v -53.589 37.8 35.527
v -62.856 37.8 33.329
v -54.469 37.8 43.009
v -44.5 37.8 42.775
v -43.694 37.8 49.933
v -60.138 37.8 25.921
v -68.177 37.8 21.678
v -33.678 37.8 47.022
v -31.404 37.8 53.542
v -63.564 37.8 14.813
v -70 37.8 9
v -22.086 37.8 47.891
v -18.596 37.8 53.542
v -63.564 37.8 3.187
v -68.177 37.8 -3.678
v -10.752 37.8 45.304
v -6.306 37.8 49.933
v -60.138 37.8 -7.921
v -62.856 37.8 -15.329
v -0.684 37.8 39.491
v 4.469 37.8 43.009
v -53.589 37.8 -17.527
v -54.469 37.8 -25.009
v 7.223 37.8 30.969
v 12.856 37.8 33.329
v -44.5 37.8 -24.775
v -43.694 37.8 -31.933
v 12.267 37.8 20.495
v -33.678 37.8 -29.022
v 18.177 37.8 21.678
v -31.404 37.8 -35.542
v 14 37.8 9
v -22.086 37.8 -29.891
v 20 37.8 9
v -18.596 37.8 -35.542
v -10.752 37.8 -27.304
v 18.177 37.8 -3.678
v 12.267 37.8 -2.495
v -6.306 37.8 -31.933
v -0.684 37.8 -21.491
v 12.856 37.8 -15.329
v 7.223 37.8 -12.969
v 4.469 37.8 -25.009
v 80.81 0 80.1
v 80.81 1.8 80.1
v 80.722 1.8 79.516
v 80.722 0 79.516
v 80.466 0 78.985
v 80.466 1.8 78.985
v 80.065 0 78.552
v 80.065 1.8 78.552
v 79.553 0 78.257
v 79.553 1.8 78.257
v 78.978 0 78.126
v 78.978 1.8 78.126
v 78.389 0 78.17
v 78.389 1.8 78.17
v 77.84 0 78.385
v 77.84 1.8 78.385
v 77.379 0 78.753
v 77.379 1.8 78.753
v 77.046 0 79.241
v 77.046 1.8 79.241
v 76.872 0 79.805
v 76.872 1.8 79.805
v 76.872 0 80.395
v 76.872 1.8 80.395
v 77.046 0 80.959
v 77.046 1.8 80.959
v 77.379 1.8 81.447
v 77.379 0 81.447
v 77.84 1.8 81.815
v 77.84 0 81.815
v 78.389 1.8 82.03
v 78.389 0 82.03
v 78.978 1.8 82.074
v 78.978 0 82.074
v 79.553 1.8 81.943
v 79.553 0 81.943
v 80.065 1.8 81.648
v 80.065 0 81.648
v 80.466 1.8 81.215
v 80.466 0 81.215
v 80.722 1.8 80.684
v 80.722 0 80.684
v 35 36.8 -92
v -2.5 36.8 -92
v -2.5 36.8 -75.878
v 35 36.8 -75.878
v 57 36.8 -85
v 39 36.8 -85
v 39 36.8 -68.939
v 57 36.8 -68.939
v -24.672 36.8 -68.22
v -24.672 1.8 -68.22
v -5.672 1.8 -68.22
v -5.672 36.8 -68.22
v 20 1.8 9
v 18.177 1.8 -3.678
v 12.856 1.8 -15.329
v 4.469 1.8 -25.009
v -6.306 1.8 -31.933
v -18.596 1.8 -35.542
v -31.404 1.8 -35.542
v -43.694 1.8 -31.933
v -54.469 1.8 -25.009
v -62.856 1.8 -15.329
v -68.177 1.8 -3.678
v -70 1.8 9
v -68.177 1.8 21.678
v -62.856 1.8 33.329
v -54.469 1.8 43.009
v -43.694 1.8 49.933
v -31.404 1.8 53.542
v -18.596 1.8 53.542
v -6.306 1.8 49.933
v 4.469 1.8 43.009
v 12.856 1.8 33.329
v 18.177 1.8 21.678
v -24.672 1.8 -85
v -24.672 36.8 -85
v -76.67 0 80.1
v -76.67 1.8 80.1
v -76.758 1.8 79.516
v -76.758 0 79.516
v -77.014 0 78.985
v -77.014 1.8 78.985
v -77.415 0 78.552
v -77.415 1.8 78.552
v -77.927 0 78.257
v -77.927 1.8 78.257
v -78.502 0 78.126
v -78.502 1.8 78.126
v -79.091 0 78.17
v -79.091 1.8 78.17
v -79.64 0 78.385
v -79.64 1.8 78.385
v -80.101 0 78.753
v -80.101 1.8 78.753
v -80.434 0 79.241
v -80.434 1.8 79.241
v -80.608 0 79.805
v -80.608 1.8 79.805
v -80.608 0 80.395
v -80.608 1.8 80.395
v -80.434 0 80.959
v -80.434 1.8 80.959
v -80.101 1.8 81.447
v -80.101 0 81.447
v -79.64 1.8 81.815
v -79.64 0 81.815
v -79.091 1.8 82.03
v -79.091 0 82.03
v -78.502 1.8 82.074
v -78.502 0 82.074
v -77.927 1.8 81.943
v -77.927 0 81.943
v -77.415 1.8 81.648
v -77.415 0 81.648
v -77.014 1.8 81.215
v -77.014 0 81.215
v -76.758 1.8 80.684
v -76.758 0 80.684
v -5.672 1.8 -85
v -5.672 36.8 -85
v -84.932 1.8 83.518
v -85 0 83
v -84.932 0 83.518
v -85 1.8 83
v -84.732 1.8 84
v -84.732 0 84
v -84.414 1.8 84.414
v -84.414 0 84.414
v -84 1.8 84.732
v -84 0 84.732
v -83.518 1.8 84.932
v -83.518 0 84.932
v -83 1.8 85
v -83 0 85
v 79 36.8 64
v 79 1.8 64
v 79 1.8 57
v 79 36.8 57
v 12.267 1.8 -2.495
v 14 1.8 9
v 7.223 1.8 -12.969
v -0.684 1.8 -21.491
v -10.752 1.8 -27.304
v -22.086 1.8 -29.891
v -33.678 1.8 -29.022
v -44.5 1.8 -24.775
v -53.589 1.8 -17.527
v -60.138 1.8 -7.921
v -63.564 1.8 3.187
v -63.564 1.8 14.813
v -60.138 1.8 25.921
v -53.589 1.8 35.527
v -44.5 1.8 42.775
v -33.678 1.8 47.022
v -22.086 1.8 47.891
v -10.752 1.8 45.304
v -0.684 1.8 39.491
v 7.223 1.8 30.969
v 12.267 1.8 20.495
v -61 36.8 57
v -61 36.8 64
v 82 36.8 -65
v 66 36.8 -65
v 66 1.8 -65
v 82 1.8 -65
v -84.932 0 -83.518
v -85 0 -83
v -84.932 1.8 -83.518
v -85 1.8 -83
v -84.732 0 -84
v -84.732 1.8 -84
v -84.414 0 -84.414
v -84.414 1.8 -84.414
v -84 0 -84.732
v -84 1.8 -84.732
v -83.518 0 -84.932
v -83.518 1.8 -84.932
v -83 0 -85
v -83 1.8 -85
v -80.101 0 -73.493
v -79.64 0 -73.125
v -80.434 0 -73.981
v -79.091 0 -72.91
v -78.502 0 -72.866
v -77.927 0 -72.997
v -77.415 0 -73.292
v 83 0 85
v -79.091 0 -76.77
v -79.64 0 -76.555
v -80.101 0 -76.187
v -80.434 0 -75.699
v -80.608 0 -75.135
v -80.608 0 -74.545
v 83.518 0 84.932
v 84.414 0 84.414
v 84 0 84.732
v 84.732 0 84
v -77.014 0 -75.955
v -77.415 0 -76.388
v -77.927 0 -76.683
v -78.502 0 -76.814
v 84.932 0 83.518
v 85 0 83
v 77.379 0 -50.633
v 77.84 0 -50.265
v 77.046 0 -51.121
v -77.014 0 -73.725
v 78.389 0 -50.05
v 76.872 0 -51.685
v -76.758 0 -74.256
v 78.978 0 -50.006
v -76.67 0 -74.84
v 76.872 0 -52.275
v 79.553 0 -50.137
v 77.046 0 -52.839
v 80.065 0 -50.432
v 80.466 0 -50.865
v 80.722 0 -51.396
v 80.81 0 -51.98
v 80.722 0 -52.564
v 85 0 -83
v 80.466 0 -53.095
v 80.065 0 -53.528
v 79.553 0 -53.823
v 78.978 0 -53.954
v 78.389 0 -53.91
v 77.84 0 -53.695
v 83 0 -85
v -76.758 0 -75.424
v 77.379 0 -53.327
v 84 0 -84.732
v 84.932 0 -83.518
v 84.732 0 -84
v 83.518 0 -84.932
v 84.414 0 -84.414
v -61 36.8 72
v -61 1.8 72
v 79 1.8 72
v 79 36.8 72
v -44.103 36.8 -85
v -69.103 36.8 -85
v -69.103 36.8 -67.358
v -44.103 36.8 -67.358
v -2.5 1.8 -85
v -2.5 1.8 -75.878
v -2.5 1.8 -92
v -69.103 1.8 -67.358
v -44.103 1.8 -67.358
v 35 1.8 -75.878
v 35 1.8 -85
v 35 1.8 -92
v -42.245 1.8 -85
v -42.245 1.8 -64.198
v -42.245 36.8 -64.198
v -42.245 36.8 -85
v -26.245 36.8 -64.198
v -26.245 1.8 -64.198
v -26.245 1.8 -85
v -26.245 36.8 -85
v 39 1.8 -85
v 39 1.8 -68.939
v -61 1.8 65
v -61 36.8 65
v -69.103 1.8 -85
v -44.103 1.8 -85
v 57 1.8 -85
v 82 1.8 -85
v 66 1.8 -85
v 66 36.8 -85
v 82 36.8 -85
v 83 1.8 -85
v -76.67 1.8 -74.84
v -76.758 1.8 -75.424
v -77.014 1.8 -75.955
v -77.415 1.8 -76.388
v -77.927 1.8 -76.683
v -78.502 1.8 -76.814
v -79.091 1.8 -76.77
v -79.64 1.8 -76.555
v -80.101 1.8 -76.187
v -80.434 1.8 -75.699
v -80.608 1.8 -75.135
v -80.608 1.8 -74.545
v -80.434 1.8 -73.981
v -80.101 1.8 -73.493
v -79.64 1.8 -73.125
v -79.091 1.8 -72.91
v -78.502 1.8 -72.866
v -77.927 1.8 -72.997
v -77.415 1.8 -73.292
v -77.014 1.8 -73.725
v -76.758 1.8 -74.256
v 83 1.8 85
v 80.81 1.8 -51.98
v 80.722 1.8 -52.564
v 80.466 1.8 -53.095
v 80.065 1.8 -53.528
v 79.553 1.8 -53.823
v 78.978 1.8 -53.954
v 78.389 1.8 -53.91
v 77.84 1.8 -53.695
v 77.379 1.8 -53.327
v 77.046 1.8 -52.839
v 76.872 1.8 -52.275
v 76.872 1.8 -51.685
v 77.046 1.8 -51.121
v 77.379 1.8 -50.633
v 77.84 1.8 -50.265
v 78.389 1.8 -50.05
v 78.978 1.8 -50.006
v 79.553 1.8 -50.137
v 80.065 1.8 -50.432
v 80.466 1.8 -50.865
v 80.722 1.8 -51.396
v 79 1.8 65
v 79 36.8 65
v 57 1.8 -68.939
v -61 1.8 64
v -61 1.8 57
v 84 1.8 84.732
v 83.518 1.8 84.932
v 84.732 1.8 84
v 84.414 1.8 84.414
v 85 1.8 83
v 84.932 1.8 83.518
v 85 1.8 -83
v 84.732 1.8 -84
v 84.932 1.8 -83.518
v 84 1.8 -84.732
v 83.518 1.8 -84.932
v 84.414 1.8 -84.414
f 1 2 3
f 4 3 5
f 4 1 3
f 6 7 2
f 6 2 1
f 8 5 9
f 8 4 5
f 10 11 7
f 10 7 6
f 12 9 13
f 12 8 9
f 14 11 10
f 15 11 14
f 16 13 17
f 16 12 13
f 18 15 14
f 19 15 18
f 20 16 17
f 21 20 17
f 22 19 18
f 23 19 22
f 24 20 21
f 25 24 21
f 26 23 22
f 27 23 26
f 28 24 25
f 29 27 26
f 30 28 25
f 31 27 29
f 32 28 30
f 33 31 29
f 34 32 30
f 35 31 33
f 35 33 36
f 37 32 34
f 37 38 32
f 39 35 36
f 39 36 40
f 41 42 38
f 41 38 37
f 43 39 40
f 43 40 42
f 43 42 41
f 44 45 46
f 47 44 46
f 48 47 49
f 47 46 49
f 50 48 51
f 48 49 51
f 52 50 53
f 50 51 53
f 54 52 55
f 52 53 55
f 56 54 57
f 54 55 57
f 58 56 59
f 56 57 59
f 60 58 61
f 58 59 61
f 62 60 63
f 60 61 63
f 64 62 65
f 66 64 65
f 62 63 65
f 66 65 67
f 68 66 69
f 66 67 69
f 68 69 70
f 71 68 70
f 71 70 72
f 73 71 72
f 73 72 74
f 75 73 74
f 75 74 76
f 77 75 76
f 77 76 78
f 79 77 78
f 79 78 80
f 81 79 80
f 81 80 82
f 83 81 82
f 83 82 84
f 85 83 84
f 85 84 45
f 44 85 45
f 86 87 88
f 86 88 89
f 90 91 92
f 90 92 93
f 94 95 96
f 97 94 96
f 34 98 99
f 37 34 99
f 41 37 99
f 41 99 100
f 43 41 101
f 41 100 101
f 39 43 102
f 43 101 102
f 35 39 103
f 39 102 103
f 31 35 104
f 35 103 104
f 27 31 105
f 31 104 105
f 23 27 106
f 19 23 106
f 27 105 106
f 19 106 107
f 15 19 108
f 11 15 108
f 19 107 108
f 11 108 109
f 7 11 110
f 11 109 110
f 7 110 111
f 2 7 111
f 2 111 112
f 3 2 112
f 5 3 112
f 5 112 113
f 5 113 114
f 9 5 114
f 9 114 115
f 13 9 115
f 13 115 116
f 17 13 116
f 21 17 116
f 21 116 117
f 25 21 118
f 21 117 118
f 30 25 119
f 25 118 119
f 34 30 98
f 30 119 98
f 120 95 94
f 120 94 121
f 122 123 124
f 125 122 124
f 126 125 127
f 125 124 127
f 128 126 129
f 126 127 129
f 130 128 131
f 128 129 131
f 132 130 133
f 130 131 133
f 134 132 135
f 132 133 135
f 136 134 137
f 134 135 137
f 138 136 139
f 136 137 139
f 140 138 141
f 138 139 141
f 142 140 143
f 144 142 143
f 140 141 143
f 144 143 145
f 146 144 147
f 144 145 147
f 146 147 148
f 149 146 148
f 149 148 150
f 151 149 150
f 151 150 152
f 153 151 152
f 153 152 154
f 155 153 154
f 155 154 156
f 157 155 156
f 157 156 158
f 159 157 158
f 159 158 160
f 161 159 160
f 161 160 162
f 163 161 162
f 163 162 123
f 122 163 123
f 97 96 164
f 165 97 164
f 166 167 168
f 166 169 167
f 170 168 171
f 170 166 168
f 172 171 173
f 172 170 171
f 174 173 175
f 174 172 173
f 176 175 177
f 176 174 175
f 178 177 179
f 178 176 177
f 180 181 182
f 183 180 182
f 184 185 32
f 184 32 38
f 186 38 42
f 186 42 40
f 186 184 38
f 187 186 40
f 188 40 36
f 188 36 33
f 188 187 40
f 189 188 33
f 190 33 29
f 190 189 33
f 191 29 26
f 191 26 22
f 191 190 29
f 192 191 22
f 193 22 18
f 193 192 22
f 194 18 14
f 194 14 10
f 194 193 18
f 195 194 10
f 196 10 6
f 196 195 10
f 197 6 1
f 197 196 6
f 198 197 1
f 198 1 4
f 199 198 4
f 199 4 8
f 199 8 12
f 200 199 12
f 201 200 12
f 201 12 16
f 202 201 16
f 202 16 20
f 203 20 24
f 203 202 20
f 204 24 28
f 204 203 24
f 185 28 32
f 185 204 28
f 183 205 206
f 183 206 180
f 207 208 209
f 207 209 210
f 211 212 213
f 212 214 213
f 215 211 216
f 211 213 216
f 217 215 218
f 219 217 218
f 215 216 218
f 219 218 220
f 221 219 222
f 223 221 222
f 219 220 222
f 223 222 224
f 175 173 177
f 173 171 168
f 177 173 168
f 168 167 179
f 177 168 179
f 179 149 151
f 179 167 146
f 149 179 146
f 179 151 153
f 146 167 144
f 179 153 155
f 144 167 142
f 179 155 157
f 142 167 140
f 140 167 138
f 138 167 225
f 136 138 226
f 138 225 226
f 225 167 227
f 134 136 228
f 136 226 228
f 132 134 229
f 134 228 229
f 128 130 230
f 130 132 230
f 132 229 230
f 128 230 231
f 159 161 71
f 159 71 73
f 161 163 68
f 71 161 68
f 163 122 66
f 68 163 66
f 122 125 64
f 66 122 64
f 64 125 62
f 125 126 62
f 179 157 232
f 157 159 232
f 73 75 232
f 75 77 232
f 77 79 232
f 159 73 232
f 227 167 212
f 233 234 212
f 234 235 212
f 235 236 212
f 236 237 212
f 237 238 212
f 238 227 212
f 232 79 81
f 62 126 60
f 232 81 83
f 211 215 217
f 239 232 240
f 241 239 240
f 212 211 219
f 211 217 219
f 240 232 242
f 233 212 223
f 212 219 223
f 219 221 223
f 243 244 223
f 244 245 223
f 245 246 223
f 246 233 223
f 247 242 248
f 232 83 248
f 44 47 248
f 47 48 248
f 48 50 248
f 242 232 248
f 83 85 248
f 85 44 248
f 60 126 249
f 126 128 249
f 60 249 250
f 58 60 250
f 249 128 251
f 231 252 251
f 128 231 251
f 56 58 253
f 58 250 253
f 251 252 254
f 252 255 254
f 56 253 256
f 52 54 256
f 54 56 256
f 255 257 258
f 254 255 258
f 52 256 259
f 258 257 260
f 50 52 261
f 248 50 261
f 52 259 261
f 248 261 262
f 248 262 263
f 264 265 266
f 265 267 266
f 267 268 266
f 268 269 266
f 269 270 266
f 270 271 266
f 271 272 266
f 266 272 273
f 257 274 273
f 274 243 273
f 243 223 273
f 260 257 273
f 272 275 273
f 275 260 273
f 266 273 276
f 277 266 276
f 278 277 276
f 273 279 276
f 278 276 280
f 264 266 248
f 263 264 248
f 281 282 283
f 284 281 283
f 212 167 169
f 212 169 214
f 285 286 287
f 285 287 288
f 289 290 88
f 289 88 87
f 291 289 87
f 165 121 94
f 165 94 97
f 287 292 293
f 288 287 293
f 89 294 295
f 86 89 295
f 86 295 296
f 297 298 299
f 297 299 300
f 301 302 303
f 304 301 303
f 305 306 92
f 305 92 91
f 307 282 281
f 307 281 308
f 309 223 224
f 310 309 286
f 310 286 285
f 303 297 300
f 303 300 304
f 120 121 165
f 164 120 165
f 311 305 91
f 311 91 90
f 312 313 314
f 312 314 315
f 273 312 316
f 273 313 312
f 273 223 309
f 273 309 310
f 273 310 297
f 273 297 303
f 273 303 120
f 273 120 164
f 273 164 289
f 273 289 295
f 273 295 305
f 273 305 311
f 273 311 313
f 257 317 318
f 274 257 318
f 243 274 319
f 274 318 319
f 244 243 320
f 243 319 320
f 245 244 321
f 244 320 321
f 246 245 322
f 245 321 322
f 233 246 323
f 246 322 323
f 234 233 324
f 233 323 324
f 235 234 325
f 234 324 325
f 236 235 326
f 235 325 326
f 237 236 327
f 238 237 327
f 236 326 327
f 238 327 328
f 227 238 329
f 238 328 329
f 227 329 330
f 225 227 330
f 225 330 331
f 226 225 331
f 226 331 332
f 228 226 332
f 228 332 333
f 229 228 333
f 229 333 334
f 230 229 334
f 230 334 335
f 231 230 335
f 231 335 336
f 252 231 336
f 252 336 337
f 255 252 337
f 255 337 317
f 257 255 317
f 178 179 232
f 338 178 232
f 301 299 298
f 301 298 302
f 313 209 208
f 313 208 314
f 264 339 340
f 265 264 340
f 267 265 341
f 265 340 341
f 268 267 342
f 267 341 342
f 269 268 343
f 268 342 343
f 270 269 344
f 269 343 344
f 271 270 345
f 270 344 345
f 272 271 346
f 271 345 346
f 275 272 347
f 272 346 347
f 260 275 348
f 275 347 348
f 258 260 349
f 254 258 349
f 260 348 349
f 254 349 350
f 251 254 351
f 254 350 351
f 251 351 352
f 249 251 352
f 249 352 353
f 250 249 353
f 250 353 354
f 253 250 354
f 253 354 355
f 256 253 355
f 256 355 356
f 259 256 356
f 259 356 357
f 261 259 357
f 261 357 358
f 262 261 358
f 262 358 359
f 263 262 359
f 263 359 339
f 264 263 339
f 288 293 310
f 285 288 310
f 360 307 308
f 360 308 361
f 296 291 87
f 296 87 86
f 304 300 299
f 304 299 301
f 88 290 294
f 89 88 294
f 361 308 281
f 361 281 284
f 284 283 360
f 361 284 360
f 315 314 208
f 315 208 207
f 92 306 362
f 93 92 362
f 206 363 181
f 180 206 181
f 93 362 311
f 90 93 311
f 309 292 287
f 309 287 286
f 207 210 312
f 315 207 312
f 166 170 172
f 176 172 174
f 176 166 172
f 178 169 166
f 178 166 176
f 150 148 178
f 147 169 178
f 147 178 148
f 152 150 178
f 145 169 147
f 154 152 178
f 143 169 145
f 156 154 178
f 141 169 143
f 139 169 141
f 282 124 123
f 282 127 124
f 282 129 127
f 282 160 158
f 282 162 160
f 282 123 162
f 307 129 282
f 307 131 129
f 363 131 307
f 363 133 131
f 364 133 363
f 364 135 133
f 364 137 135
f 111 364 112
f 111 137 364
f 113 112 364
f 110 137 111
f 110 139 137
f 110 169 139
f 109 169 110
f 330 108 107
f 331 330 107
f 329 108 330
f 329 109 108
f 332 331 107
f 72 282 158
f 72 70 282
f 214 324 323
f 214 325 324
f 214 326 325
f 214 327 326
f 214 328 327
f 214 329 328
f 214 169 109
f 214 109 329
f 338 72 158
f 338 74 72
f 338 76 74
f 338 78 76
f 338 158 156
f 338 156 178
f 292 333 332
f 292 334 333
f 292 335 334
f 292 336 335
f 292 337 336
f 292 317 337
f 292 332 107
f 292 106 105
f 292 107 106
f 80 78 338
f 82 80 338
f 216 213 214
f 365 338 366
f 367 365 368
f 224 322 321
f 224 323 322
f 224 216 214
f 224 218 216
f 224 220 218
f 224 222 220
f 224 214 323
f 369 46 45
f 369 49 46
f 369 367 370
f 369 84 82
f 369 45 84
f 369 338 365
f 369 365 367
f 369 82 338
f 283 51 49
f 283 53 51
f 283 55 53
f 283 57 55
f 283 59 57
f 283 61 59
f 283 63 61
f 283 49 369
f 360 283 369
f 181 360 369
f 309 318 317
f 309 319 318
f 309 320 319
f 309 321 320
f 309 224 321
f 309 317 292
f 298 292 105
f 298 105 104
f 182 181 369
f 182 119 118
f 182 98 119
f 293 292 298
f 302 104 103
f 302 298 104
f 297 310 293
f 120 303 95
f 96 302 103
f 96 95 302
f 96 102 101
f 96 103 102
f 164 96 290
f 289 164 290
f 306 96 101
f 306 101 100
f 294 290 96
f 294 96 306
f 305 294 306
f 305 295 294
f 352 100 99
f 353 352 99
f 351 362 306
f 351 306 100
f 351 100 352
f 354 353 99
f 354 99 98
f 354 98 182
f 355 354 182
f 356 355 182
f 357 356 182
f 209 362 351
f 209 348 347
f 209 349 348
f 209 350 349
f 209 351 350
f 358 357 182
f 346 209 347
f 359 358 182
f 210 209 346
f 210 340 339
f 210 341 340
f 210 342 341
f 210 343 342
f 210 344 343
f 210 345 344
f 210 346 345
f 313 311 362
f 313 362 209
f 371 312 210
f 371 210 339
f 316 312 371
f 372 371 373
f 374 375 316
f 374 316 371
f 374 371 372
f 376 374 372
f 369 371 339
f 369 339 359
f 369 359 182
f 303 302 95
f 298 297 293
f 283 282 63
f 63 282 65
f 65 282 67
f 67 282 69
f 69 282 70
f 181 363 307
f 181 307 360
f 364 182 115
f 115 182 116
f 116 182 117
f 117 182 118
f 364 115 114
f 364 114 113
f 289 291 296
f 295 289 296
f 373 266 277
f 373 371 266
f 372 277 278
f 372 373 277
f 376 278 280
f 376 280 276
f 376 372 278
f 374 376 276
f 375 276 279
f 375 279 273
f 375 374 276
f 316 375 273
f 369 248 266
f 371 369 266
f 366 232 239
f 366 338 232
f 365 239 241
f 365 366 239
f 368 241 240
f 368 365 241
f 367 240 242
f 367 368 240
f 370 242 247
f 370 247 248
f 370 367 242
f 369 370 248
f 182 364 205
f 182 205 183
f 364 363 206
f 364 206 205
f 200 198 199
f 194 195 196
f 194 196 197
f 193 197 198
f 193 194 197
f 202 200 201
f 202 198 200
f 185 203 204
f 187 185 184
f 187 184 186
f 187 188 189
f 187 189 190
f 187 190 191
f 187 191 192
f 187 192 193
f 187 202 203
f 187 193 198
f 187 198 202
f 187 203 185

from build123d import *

# Parameters (mm, degrees)
SKETCH1_W           = 170
SKETCH1_H           = 170
BOSS_EXTRUDE1_DEPTH = 1.8
FILLET1_R           = 2
SKETCH2_R           = 1.98
CUT_EXTRUDE1_DEPTH  = 2
SKETCH3_W           = 16
SKETCH3_H           = 20
SKETCH3_W_2         = 37.5
SKETCH3_H_2         = 16.121954722
SKETCH3_W_3         = 18
SKETCH3_H_3         = 16.061076517
SKETCH3_W_4         = 19
SKETCH3_H_4         = 16.780154479
SKETCH3_H_5         = 20.801567196
SKETCH3_W_5         = 25
SKETCH3_H_6         = 17.641885776
BOSS_EXTRUDE2_DEPTH = 35
SKETCH4_W           = 140
SKETCH4_H           = 7
BOSS_EXTRUDE3_DEPTH = 35
LPATTERN1_COUNT     = 2
LPATTERN1_PITCH     = 8
SKETCH5_R           = 45
SKETCH5_R_2         = 39
BOSS_EXTRUDE4_DEPTH = 36


with BuildPart() as part:
    # Sketch1 → Boss-Extrude1 (new body)
    with BuildSketch(Plane(origin=(0, 0, 0), x_dir=(1, 0, 0), z_dir=(0, 1, 0))):
        Rectangle(SKETCH1_W, SKETCH1_H)
    extrude(amount=BOSS_EXTRUDE1_DEPTH)

    # Fillet1
    fillet1_edges = [part.edges().sort_by_distance(p)[0] for p in [
        (-85, 0.9, -85),
        (85, 0.9, -85),
        (85, 0.9, 85),
        (-85, 0.9, 85),
    ]]
    fillet(fillet1_edges, radius=FILLET1_R)

    # Sketch2 → Cut-Extrude1 (cut)
    with BuildSketch(Plane(origin=(0, 1.8, 0), x_dir=(1, 0, 0), z_dir=(0, 1, 0))):
        with Locations((-78.65, 74.84)):
            Circle(SKETCH2_R)
        with Locations((-78.65, -80.1)):
            Circle(SKETCH2_R)
        with Locations((78.83, -80.1)):
            Circle(SKETCH2_R)
        with Locations((78.83, 51.98)):
            Circle(SKETCH2_R)
    extrude(amount=-CUT_EXTRUDE1_DEPTH, mode=Mode.SUBTRACT)

    # Sketch3 → Boss-Extrude2 (add)
    with BuildSketch(Plane(origin=(0, 1.8, 0), x_dir=(1, 0, 0), z_dir=(0, 1, 0))):
        with Locations((74, 75)):
            Rectangle(SKETCH3_W, SKETCH3_H)
        with Locations((16.25, 83.939022639)):
            Rectangle(SKETCH3_W_2, SKETCH3_H_2)
        with Locations((48, 76.969461741)):
            Rectangle(SKETCH3_W_3, SKETCH3_H_3)
        with Locations((-15.17206747, 76.609922761)):
            Rectangle(SKETCH3_W_4, SKETCH3_H_4)
        with Locations((-34.244584998, 74.599216402)):
            Rectangle(SKETCH3_W, SKETCH3_H_5)
        with Locations((-56.603208404, 76.179057112)):
            Rectangle(SKETCH3_W_5, SKETCH3_H_6)
    extrude(amount=BOSS_EXTRUDE2_DEPTH)

    # Sketch4 → Boss-Extrude3 (add)
    with BuildSketch(Plane(origin=(0, 1.8, 0), x_dir=(1, 0, 0), z_dir=(0, 1, 0))):
        with Locations((9, -68.5)):
            Rectangle(SKETCH4_W, SKETCH4_H)
    boss_extrude3 = extrude(amount=BOSS_EXTRUDE3_DEPTH)

    # LPattern1: Boss-Extrude3 ×2
    with Locations(*[(0, 0, -i * LPATTERN1_PITCH) for i in range(1, LPATTERN1_COUNT)]):
        add(boss_extrude3)

    # Sketch5 → Boss-Extrude4 (add)
    with BuildSketch(Plane(origin=(0, 1.8, 0), x_dir=(1, 0, 0), z_dir=(0, 1, 0))):
        with Locations((-25, -9)):
            Circle(SKETCH5_R)
        with Locations((-25, -9)):
            Circle(SKETCH5_R_2, mode=Mode.SUBTRACT)
    extrude(amount=BOSS_EXTRUDE4_DEPTH)


solid = part.part
